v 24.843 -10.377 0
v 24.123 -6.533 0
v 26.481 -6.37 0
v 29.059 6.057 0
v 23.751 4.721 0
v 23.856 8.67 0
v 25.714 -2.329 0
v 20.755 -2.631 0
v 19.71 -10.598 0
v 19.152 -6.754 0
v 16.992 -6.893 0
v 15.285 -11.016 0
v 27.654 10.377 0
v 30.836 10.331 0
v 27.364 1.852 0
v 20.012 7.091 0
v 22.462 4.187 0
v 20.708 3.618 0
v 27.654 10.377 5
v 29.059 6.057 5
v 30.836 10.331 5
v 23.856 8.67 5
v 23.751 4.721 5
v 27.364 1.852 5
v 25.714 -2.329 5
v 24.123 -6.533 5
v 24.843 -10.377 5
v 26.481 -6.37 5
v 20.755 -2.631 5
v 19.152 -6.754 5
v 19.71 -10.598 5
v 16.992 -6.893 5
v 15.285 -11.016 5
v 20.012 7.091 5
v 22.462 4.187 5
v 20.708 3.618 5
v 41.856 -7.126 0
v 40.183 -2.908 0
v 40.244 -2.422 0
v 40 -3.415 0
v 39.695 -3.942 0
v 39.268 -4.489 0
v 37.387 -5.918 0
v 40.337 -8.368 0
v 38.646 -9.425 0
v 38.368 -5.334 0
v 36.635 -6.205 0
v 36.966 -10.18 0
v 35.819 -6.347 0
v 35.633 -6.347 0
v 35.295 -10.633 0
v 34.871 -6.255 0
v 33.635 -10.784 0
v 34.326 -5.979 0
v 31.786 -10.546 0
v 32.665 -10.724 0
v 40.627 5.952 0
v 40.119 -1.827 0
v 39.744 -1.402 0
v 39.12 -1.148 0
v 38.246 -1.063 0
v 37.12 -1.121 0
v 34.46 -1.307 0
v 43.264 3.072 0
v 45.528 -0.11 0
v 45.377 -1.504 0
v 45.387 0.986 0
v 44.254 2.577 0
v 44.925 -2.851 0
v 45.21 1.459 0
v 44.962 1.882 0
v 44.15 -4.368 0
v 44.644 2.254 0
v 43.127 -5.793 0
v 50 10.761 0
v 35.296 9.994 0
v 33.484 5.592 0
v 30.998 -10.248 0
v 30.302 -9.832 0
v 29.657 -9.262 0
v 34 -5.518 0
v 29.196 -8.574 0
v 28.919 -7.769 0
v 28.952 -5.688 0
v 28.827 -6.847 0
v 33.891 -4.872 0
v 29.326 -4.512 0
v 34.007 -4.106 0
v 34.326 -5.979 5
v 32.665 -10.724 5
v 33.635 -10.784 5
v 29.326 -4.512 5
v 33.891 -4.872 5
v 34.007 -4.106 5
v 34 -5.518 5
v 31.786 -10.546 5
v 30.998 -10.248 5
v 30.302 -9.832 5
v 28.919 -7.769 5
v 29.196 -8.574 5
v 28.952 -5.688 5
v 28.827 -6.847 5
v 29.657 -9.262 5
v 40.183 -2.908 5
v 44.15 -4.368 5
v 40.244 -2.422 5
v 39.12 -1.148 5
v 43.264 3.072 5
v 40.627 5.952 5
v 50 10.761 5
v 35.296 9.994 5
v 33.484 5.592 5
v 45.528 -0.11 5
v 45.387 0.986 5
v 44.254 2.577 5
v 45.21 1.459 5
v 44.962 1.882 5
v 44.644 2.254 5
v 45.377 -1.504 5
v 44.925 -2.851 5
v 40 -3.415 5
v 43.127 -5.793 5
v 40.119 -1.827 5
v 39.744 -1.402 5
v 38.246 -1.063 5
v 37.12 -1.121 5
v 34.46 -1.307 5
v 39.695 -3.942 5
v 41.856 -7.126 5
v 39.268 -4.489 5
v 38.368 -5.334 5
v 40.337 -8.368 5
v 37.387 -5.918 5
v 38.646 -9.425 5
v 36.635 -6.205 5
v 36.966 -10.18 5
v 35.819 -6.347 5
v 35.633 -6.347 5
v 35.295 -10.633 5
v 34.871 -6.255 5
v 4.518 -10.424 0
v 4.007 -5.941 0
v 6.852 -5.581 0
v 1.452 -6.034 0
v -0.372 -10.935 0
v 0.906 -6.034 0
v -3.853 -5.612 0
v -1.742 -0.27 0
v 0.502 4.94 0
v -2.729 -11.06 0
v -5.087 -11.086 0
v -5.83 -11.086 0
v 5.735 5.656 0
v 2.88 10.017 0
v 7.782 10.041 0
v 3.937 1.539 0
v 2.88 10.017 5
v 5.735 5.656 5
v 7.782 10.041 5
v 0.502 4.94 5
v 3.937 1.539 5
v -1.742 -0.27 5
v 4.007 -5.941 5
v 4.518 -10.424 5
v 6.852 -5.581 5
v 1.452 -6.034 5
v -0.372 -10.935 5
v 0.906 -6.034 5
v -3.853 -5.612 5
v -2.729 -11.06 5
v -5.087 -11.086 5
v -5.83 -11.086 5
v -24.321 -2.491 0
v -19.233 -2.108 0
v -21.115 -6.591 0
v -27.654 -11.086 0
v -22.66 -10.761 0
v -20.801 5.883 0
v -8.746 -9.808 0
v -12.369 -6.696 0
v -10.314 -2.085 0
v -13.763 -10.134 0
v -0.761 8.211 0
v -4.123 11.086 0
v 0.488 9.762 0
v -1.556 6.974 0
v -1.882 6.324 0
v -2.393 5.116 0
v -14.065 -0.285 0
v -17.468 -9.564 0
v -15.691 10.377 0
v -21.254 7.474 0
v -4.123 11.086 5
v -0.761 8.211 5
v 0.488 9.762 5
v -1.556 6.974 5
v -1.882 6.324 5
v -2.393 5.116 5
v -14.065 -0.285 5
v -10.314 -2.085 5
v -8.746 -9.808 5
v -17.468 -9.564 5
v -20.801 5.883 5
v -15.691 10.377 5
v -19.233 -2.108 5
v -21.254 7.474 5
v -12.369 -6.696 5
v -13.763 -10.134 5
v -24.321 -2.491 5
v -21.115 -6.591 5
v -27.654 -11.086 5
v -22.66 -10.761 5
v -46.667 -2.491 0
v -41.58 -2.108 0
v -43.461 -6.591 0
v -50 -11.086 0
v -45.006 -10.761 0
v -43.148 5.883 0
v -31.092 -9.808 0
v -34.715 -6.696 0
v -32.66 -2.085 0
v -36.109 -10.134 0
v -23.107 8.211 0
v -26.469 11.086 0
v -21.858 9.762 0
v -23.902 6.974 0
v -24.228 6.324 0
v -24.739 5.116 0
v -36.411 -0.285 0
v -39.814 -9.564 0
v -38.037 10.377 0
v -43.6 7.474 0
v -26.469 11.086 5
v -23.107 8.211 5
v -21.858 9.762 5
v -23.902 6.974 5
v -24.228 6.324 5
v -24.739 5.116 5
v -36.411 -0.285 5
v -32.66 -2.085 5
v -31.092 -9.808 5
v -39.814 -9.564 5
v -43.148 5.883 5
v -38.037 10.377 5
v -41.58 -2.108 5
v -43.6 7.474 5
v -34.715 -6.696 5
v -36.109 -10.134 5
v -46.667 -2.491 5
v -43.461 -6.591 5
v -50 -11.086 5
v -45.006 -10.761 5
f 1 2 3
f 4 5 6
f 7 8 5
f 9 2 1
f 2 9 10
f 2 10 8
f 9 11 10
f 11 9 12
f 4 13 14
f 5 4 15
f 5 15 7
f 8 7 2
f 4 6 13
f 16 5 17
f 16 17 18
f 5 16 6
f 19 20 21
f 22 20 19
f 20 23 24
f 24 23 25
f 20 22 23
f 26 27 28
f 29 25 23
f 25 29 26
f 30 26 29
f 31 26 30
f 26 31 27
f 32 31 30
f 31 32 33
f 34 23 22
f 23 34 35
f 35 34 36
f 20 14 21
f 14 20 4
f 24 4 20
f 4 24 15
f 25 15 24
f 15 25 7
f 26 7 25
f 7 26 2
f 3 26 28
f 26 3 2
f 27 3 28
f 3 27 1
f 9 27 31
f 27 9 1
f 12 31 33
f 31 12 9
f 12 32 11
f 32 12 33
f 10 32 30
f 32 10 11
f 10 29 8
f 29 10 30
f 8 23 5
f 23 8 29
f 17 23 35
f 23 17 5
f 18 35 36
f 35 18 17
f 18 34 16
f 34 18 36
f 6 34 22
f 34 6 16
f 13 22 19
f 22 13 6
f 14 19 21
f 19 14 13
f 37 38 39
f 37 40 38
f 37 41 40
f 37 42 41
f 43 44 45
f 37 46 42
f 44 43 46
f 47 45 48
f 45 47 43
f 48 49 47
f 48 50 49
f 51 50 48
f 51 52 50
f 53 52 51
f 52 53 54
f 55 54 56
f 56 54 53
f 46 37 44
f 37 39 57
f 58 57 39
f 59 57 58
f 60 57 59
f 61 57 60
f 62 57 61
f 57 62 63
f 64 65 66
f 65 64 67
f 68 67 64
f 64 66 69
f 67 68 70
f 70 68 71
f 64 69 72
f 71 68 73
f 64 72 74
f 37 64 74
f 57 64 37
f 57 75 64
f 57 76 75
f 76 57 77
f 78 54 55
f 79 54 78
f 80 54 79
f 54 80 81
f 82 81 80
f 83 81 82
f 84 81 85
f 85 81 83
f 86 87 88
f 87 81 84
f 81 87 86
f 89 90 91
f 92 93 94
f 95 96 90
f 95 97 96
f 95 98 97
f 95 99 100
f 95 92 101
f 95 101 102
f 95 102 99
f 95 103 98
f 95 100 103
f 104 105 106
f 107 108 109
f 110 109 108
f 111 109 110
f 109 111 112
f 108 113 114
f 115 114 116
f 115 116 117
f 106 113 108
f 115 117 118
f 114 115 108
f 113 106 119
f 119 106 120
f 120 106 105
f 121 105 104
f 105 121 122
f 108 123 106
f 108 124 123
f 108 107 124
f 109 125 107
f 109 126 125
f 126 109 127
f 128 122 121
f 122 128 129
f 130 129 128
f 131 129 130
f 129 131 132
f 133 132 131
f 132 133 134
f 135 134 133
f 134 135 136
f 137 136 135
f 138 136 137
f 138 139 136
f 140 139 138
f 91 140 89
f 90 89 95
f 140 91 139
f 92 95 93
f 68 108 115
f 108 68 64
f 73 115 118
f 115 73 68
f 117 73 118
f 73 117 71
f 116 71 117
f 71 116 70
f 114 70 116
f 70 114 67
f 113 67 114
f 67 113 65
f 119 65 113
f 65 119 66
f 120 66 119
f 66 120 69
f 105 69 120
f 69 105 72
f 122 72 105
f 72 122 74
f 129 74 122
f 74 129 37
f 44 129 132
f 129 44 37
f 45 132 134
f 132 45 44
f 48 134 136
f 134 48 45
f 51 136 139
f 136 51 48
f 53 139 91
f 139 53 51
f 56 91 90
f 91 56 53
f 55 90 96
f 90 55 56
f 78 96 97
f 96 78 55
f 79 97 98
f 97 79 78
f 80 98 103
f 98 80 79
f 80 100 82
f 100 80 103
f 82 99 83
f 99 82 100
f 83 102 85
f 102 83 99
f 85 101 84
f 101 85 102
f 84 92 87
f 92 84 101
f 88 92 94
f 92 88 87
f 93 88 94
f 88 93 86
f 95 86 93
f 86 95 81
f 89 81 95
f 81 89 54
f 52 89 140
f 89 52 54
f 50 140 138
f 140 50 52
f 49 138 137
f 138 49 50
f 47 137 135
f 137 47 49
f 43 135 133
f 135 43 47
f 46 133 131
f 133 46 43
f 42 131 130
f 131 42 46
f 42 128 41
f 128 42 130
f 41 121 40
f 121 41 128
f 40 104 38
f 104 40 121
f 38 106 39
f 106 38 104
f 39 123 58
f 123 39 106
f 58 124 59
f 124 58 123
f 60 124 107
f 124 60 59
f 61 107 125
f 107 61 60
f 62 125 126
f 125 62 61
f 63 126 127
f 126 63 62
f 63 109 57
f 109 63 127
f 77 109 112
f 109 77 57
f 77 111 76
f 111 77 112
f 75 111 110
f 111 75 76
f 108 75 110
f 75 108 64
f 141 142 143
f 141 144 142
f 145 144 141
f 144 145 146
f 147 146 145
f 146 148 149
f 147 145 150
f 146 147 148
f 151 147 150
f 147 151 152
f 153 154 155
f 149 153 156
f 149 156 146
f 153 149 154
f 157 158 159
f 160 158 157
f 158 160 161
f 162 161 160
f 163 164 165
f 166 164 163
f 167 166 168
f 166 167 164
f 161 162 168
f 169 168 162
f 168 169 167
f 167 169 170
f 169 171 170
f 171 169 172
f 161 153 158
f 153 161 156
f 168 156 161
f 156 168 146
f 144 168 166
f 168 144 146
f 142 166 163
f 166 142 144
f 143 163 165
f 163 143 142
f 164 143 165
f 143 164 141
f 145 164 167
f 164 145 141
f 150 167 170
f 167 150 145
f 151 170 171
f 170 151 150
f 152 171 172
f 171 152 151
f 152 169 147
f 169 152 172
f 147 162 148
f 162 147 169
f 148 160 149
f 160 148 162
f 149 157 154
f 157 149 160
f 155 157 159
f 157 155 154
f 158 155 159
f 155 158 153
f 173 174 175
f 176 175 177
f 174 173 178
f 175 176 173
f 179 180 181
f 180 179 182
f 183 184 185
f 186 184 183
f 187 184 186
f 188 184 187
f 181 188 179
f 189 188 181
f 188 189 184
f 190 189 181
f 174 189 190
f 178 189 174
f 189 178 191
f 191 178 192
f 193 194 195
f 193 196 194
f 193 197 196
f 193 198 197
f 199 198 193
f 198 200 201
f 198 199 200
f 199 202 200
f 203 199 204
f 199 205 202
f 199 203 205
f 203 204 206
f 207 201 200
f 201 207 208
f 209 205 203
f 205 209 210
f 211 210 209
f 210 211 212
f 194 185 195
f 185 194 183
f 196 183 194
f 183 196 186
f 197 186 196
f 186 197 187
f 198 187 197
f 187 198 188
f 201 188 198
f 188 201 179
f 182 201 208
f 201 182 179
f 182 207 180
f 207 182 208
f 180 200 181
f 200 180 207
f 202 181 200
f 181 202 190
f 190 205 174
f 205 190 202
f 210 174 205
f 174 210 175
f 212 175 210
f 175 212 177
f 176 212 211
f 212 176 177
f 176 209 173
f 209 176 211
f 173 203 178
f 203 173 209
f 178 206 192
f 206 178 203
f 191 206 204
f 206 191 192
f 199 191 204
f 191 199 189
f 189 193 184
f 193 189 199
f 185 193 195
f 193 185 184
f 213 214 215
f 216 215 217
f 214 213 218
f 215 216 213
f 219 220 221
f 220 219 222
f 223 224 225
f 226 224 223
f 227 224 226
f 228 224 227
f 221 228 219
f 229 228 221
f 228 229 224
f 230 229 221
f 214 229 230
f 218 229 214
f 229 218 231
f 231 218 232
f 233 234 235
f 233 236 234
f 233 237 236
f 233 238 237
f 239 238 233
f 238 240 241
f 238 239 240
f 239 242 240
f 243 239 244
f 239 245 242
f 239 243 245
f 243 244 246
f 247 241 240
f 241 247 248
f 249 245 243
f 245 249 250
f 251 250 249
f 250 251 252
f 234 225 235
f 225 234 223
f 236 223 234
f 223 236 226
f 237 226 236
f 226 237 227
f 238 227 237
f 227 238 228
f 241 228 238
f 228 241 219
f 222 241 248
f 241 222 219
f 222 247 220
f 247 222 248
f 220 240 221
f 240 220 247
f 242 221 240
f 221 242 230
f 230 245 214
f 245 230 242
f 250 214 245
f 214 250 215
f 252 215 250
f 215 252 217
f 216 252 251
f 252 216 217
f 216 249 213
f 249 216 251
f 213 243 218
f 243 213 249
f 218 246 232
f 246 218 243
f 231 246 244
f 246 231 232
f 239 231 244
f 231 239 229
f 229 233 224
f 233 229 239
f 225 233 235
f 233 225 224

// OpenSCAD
// Module names are of the form poly_<inkscape-path-id>().  As a result,
// you can associate a polygon in this OpenSCAD program with the corresponding
// SVG element in the Inkscape document by looking for the XML element with
// the attribute id="inkscape-path-id".

// fudge value is used to ensure that subtracted solids are a tad taller
// in the z dimension than the polygon being subtracted from.  This helps
// keep the resulting .stl file manifold.
fudge = 0.1;

module poly_path3100(h)
{
  scale([25.4/90, -25.4/90, 1]) union()
  {
    linear_extrude(height=h)
      polygon([[109.262260,-36.605944],[102.965791,-21.461495],[96.957396,-6.563966],[91.113614,8.251255],[85.475599,23.148784],[93.829738,22.572636],[88.027109,36.770557],[69.837309,37.552472],[54.157866,39.033994],[60.207415,24.424539],[67.861946,23.930698],[73.541115,9.321244],[84.158690,-16.728855],[79.590664,-14.835798],[73.376501,-12.819282],[70.907297,-25.124147],[84.529071,-30.721008],[97.986231,-36.770557]]);
  }
}

module poly_path3102(h)
{
  scale([25.4/90, -25.4/90, 1]) union()
  {
    linear_extrude(height=h)
      polygon([[153.296392,-10.885073],[156.807254,-9.130884],[158.186526,-7.987584],[159.315026,-6.666815],[160.192754,-5.168576],[160.819709,-3.492868],[161.321304,0.390957],[160.786258,5.329386],[159.181327,10.103158],[156.436876,15.476257],[152.812795,20.525265],[148.309082,25.250185],[142.925736,29.651020],[136.935325,33.395977],[130.980936,36.070948],[125.062570,37.675931],[119.180228,38.210926],[115.741336,38.000014],[112.626536,37.367280],[109.835825,36.312724],[107.369204,34.836348],[105.082613,32.817263],[103.449335,30.381498],[102.469372,27.529053],[102.142723,24.259926],[102.585114,20.154884],[103.912319,15.988093],[120.497137,14.547725],[120.085603,17.263849],[120.471401,19.550445],[121.628835,21.183723],[123.557906,22.163683],[126.258612,22.490330],[126.917066,22.490330],[129.808069,21.986209],[132.472774,20.967654],[135.950203,18.899706],[139.139624,15.905787],[140.651982,13.966447],[141.732249,12.099116],[142.380424,10.303794],[142.596509,8.580483],[142.154082,6.473960],[140.826877,4.969297],[138.614893,4.066490],[135.518126,3.765536],[131.526246,3.971302],[122.102119,4.629757],[143.954571,-21.091114],[118.645234,-19.815359],[125.065164,-35.412495],[177.165360,-38.128619]]);
  }
}

module poly_path3098(h)
{
  scale([25.4/90, -25.4/90, 1]) union()
  {
    linear_extrude(height=h)
      polygon([[27.572774,-35.577109],[20.319455,-20.041660],[13.951000,-5.452825],[3.209965,21.379188],[5.144174,21.379188],[14.197921,21.049961],[24.280502,19.774206],[16.008670,36.935171],[-1.316909,38.745920],[-9.671057,39.188316],[-18.025186,39.280914],[-20.659004,39.280914],[-13.652645,19.884823],[-6.173021,0.956843],[1.779874,-17.503031],[10.206042,-35.494802]]);
  }
}

module poly_path3096(h)
{
  scale([25.4/90, -25.4/90, 1]) union()
  {
    linear_extrude(height=h)
      polygon([[1.728443,-34.589427],[-2.695621,-29.095400],[-5.514555,-24.712613],[-6.666850,-22.408023],[-8.477599,-18.128070],[-30.988505,34.754041],[-48.766772,35.906336],[-43.828364,23.724931],[-36.544214,7.387034],[-61.894704,33.889820],[-68.150020,7.469341],[-74.816870,23.354551],[-80.290271,38.128619],[-97.986231,39.280914],[-86.175207,8.827403],[-73.705728,-20.844194],[-75.310711,-26.482209],[-55.598235,-36.770557],[-49.836760,1.008258],[-14.609455,-39.280914]]);
  }
}

module poly_path3094(h)
{
  scale([25.4/90, -25.4/90, 1]) union()
  {
    linear_extrude(height=h)
      polygon([[-77.450687,-34.589427],[-81.874751,-29.095400],[-84.693684,-24.712613],[-85.845979,-22.408023],[-87.656729,-18.128070],[-110.167635,34.754041],[-127.945901,35.906336],[-123.007494,23.724931],[-115.723343,7.387034],[-141.073834,33.889820],[-147.329150,7.469341],[-153.995999,23.354551],[-159.469401,38.128619],[-177.165360,39.280914],[-165.354336,8.827403],[-152.884858,-20.844194],[-154.489840,-26.482209],[-134.777365,-36.770557],[-129.015889,1.008258],[-93.788584,-39.280914]]);
  }
}

poly_path3100(5);
poly_path3102(5);
poly_path3098(5);
poly_path3096(5);
poly_path3094(5);
